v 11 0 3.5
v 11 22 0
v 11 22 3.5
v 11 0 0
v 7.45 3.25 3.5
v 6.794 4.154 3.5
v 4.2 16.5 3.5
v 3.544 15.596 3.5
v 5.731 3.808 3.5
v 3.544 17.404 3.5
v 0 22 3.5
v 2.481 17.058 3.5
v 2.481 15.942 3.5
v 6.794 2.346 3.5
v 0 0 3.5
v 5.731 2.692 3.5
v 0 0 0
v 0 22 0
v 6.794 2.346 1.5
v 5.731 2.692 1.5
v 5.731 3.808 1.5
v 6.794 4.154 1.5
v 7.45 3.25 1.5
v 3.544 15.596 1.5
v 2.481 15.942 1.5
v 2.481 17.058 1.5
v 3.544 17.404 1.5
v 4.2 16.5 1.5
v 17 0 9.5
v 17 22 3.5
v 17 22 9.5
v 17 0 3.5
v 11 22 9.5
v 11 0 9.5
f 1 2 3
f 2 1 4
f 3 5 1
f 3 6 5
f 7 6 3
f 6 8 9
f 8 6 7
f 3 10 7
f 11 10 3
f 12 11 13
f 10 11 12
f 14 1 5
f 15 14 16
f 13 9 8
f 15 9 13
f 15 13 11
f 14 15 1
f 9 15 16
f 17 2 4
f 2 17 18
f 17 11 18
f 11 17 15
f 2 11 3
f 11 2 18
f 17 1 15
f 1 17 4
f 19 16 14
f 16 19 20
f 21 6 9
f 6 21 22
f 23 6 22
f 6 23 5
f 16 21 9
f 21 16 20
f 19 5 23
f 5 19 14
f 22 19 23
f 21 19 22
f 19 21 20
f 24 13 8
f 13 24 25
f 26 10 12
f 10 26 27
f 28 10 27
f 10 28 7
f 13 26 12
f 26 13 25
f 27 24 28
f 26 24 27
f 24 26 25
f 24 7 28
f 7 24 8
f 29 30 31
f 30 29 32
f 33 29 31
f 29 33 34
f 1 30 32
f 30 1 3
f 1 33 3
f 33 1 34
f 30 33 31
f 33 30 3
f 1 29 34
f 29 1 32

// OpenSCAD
floorThickness = 3.5;
baseCameraSideThickness = 6;
holesSize = 2;
center = 3.25;
centerSide = 5.5;

microswitch();

module microswitch() {   
    switchTrigger = 6; 
    switchHeight = 6;
    switchWidth = 22;
    switchDepth = 11;    

    difference() {
        cube(size=[switchDepth,switchWidth, floorThickness]);    
        translate([centerSide+1, center,1.5]) {
            mountingHole();
        }
        translate([center, switchWidth-centerSide,1.5]) {
            mountingHole();
        }
    }
    
    translate([switchDepth, 0, floorThickness]){
        cube(size=[switchHeight, switchWidth, switchHeight]); 
    }
    
}


module mountingHole() {
    cylinder(h = 4.02, r1 = holesSize/2 - 0.05, r2 = holesSize/2 - 0.05, center = false);
}
